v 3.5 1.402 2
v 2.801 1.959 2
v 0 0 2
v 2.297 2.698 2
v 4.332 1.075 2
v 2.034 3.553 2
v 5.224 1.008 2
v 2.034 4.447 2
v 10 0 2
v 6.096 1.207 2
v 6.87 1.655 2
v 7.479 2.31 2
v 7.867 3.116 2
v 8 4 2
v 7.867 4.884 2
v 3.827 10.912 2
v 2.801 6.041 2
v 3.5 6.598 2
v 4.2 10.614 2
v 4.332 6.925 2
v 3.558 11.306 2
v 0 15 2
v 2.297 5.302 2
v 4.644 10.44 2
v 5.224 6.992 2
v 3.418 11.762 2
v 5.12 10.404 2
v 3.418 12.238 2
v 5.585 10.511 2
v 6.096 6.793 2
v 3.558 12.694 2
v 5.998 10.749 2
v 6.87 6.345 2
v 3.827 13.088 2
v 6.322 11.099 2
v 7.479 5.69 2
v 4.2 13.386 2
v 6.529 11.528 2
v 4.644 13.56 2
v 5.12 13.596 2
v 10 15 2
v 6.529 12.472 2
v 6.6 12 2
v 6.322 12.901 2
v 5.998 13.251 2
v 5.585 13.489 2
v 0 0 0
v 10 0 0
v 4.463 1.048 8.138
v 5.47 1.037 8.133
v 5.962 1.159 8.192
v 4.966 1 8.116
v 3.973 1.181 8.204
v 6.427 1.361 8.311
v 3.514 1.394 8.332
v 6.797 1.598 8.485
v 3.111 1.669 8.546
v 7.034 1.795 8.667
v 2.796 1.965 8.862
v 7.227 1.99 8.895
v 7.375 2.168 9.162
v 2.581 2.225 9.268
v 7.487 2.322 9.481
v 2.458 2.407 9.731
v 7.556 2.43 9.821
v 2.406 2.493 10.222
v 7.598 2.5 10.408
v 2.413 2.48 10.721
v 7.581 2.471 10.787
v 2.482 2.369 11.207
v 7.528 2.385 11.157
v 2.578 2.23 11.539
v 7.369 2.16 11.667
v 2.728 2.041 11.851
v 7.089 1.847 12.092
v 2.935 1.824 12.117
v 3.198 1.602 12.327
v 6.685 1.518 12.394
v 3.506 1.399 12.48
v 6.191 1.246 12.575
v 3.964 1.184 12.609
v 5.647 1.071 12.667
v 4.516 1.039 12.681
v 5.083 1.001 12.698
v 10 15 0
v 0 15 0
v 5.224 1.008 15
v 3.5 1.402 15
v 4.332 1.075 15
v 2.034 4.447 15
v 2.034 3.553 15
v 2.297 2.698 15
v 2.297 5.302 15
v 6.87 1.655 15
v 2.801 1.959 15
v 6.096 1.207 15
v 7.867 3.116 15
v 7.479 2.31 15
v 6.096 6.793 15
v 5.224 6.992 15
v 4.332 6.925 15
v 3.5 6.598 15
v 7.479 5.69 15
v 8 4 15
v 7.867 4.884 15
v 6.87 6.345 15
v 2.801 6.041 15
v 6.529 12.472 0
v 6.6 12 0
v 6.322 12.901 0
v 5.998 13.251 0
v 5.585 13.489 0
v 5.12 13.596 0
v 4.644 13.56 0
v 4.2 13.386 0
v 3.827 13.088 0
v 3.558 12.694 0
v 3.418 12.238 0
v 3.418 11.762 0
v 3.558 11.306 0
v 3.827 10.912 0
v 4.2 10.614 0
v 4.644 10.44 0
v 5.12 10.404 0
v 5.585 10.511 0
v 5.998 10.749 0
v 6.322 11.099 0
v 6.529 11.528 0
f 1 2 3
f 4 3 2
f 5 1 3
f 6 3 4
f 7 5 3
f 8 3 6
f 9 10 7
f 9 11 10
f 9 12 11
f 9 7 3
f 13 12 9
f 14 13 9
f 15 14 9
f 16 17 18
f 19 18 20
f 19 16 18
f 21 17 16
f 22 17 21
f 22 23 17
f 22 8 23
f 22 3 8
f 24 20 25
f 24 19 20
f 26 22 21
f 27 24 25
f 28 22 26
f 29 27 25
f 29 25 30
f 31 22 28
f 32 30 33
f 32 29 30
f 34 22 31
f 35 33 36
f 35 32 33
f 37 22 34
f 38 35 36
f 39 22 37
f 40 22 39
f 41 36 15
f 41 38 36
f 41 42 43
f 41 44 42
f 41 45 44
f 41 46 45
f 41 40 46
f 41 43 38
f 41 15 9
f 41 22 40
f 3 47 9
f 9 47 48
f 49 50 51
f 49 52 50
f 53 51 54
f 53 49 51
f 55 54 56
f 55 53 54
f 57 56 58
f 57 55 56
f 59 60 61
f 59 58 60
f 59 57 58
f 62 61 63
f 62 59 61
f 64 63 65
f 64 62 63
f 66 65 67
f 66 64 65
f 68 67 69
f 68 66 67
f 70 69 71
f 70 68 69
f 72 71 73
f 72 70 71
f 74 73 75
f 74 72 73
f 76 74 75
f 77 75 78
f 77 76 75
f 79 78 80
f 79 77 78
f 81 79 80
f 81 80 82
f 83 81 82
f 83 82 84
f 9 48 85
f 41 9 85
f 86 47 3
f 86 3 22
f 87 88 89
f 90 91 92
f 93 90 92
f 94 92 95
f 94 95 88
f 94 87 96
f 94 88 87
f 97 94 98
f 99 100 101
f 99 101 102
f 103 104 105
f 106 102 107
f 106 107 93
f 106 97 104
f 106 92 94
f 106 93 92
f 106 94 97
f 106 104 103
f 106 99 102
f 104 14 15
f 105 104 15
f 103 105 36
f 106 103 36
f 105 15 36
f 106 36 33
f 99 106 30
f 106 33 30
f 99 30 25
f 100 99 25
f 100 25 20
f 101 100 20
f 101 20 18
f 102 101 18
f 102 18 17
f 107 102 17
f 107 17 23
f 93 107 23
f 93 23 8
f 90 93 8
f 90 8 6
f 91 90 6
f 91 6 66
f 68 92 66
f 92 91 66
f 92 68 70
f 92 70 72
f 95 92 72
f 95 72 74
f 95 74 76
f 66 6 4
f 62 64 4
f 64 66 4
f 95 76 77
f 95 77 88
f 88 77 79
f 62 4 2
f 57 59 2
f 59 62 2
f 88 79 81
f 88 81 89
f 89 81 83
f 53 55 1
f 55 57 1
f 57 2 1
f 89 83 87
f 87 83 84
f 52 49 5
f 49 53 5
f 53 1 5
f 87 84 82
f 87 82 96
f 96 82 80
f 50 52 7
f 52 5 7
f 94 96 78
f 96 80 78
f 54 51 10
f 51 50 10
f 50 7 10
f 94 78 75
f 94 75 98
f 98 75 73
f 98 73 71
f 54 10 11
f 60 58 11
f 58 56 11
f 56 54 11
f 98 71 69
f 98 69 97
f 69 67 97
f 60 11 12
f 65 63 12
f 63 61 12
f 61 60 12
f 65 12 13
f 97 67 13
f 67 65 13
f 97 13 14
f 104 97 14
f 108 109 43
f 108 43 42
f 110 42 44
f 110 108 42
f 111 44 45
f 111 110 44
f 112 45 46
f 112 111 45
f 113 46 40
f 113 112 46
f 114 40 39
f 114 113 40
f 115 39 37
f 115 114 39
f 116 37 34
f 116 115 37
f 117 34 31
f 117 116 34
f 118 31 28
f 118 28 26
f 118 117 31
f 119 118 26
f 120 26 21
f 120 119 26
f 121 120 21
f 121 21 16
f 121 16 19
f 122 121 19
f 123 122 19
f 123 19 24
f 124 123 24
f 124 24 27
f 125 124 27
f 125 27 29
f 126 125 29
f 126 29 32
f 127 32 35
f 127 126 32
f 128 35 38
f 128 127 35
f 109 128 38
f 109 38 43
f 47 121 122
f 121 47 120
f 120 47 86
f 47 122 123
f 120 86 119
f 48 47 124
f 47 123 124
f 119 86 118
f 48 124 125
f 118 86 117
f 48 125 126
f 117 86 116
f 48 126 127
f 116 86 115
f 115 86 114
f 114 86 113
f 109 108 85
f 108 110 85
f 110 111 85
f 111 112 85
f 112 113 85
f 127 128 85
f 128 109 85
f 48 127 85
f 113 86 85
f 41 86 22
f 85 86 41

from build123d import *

# Parameters (mm, degrees)
F0_W     = 10
F0_H     = 15
F0_R     = 3
F0_R_2   = 1.6
F1_DEPTH = 2
F3_DEPTH = 15
F2_R     = 2.5
F4_DEPTH = 10.001


with BuildPart() as f1:
    # F0 (on Top) → F1 (new body)
    with BuildSketch(Plane.XY):
        with Locations((5, 7.5)):
            Rectangle(F0_W, F0_H)
        with Locations((5, 4)):
            Circle(F0_R, mode=Mode.SUBTRACT)
        with Locations((5, 12)):
            Circle(F0_R_2, mode=Mode.SUBTRACT)
    extrude(amount=F1_DEPTH)

    # F0 (on Top) → F3 (join)
    with BuildSketch(Plane.XY):
        with Locations((5, 4)):
            Circle(F0_R)
    extrude(amount=F3_DEPTH)

    # F2 (on Right) → F4 (cut, through all)
    with BuildSketch(Plane.YZ):
        with Locations((0, 10.407558)):
            Circle(F2_R)
    extrude(amount=F4_DEPTH, mode=Mode.SUBTRACT)


solid = f1.part
